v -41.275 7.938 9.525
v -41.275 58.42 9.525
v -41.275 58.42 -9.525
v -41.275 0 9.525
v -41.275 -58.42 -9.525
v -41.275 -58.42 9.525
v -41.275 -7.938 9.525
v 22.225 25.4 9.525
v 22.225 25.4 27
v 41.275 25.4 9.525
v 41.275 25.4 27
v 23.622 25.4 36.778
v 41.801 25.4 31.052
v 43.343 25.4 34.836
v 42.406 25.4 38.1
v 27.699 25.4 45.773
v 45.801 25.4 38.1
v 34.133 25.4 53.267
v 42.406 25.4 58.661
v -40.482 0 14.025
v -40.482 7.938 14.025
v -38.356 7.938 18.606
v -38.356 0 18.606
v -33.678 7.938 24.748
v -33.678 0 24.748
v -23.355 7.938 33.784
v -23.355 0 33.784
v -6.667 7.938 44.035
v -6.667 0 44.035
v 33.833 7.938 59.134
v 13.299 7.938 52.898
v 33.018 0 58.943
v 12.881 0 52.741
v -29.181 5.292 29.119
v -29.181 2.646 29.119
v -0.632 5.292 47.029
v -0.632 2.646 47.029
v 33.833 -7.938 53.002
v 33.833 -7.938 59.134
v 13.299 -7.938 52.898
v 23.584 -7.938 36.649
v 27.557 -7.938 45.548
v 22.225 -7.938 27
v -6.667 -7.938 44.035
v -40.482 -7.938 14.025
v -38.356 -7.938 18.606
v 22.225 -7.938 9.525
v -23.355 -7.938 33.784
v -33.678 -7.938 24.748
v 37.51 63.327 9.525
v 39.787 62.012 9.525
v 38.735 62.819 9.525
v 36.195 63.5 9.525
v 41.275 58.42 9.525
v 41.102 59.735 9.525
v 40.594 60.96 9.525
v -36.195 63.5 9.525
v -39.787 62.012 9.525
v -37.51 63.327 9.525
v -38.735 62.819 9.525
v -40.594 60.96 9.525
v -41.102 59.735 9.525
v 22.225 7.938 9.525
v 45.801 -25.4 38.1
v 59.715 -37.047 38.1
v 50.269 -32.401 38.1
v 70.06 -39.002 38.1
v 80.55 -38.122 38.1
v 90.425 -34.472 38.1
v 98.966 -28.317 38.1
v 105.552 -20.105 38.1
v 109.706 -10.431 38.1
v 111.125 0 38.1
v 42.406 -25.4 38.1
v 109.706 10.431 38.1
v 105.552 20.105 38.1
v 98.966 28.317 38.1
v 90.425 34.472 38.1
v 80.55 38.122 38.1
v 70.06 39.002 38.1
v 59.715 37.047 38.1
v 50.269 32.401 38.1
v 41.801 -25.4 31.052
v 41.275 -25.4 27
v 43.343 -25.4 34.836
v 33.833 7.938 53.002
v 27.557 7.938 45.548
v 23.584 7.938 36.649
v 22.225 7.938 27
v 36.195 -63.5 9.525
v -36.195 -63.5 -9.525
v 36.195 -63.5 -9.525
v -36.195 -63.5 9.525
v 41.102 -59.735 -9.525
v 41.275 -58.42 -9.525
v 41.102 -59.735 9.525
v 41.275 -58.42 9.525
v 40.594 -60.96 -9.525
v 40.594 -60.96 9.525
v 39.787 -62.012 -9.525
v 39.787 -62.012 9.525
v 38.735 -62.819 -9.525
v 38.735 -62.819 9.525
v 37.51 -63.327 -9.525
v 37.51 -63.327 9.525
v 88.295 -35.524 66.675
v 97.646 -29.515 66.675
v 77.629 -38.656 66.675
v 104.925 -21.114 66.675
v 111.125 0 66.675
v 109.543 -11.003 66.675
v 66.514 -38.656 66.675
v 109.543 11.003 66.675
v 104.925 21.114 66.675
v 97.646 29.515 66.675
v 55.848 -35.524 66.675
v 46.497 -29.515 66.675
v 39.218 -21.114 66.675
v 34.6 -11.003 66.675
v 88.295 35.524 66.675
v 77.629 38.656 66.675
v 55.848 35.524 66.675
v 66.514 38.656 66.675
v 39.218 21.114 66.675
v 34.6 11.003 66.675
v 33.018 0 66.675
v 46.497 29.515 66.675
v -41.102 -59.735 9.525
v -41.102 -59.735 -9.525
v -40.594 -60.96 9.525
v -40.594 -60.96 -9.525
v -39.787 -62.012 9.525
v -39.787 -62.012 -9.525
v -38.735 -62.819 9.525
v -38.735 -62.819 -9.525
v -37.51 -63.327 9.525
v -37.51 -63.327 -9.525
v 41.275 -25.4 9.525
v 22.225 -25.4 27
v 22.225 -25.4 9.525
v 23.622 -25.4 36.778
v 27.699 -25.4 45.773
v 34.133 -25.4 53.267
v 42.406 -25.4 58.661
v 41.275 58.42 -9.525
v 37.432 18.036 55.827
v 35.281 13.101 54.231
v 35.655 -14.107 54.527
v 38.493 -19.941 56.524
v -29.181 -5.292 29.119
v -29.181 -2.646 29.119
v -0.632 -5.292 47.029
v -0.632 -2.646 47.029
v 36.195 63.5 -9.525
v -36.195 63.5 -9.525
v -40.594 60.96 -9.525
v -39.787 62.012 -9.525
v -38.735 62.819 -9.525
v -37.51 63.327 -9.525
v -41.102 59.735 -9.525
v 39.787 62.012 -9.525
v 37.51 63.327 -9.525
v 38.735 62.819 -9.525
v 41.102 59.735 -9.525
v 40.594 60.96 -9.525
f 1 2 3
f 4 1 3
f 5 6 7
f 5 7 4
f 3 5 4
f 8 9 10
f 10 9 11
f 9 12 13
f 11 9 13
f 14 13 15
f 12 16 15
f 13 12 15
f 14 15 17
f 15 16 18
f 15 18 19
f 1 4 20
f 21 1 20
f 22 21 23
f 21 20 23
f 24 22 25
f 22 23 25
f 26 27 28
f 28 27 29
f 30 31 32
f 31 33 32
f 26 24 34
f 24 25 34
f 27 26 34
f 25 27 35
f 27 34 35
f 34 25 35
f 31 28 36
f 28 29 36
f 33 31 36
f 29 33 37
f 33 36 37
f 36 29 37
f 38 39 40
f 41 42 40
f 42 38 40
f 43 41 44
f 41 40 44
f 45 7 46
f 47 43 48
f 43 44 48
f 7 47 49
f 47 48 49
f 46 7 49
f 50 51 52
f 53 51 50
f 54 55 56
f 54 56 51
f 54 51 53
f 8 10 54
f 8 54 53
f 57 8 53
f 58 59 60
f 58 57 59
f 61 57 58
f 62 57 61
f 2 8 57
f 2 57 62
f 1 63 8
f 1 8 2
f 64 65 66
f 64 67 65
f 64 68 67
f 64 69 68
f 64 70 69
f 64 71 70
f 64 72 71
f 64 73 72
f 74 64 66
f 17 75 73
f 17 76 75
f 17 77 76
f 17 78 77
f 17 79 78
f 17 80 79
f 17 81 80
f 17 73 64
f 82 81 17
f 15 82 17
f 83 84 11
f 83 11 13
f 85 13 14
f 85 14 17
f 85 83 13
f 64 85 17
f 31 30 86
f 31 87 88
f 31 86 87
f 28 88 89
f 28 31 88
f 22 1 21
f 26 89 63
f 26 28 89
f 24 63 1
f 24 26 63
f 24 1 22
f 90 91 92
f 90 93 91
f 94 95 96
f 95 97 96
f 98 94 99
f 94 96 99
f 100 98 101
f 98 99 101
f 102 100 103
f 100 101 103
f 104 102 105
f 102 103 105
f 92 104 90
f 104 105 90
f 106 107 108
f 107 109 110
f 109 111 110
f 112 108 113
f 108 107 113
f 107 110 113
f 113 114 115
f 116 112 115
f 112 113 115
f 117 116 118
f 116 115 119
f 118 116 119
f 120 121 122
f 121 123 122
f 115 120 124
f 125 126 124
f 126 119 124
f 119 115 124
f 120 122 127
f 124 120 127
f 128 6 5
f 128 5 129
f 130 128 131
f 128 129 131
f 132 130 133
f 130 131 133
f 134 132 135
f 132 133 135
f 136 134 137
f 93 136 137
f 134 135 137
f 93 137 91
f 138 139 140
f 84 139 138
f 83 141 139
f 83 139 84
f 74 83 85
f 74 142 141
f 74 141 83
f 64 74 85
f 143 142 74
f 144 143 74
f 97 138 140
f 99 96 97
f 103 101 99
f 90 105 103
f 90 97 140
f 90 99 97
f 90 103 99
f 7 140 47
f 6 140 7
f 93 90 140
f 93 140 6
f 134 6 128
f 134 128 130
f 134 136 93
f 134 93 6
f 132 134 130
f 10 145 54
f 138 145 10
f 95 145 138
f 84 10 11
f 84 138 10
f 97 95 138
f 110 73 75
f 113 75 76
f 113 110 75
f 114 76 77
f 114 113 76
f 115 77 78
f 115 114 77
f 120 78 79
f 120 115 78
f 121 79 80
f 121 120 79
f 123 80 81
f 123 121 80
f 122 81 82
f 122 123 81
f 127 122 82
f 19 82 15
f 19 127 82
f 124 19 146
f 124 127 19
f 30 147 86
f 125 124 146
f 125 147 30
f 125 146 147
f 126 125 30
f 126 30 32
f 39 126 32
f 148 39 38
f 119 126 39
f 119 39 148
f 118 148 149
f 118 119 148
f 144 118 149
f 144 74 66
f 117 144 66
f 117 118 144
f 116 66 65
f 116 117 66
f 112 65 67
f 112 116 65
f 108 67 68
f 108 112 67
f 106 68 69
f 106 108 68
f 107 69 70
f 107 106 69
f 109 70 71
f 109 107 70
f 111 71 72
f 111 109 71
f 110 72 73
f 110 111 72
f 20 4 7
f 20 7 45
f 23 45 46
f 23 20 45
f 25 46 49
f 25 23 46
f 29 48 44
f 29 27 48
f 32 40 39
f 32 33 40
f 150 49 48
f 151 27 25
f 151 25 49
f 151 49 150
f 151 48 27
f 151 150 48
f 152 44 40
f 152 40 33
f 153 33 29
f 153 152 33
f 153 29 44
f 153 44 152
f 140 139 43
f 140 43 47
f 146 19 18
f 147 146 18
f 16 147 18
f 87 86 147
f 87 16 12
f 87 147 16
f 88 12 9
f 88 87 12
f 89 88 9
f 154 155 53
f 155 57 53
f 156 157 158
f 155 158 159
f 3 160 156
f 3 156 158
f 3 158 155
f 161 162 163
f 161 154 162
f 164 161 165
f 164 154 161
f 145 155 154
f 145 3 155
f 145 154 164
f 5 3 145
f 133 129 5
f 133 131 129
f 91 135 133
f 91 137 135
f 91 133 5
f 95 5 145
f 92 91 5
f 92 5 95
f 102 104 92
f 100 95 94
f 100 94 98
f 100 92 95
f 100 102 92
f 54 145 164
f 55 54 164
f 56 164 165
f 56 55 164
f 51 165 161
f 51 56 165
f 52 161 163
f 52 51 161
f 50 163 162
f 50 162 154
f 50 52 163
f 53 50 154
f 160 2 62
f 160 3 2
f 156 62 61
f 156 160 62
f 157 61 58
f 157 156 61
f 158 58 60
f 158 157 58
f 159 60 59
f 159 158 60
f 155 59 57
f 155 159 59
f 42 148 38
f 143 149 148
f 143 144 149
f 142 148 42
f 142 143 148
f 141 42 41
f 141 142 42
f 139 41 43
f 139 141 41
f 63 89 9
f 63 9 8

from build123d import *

# Parameters (mm, degrees)
F1_DEPTH = 63.5
F2_DEPTH = 25.4
F3_DEPTH = 7.9375
F0_W     = 39.053507328
F0_H     = 28.575
F5_R     = 5.08


with BuildPart() as f1:
    # F0 (on Front) → F1 (new body, symmetric)
    with BuildSketch(Plane.XZ):
        Polygon((-41.275, 9.525), (-41.275, -9.525), (41.275, -9.525), (41.275, 9.525), (22.225, 9.525), align=None)
    extrude(amount=F1_DEPTH, both=True)

    # F0 (on Front) → F2 (join, symmetric)
    with BuildSketch(Plane.XZ):
        with BuildLine():
            Line((22.225, 9.525), (41.275, 9.525))
            Line((41.275, 9.525), (41.275, 27.0002))
            ThreePointArc((41.275, 27.0002), (45.9246798487, 38.2255201513), (57.15, 42.8752))
            Line((57.15, 42.8752), (60.325, 42.8752))
            Line((60.325, 42.8752), (60.325, 61.9252))
            Line((60.325, 61.9252), (57.15, 61.9252))
            ThreePointArc((57.15, 61.9252), (32.4542956671, 51.6959043329), (22.225, 27.0002))
            Line((22.225, 27.0002), (22.225, 9.525))
        make_face()
        Polygon((60.325, 66.675), (60.325, 61.9252), (60.325, 42.8752), (60.325, 38.1), (72.071492672, 38.1), (72.071492672, 66.675), align=None)
    extrude(amount=F2_DEPTH, both=True)

    # F0 (on Front) → F3 (join, symmetric)
    with BuildSketch(Plane.XZ):
        with BuildLine():
            add(Edge.make_bspline(
                [(-41.275, 9.525), (-40.8343672752, 33.3350226283), (22.7826405317, 62.8510192037), (57.15, 61.9252)],
                knots=[0, 0, 0, 0, 111.5045361635, 111.5045361635, 111.5045361635, 111.5045361635], degree=3))
            Line((-41.275, 9.525), (22.225, 9.525))
            Line((22.225, 9.525), (22.225, 27.0002))
            ThreePointArc((22.225, 27.0002), (32.4542956671, 51.6959043329), (57.15, 61.9252))
        make_face()
    extrude(amount=F3_DEPTH, both=True)

    # F0 (on Front) → F4 (revolve)
    with BuildSketch(Plane.XZ):
        with Locations((91.598246336, 52.3875)):
            Rectangle(F0_W, F0_H)
    revolve(axis=Axis((72.071492672, 0, 52.3875), (0, 0, 1)))

    # F5
    f5_edges = [f1.edges().sort_by_distance(p)[0] for p in [
        (41.275, -63.5, 0),
        (41.275, 63.5, 0),
        (-41.275, 63.5, 0),
        (-41.275, -63.5, 0),
    ]]
    fillet(f5_edges, radius=F5_R)


solid = f1.part
